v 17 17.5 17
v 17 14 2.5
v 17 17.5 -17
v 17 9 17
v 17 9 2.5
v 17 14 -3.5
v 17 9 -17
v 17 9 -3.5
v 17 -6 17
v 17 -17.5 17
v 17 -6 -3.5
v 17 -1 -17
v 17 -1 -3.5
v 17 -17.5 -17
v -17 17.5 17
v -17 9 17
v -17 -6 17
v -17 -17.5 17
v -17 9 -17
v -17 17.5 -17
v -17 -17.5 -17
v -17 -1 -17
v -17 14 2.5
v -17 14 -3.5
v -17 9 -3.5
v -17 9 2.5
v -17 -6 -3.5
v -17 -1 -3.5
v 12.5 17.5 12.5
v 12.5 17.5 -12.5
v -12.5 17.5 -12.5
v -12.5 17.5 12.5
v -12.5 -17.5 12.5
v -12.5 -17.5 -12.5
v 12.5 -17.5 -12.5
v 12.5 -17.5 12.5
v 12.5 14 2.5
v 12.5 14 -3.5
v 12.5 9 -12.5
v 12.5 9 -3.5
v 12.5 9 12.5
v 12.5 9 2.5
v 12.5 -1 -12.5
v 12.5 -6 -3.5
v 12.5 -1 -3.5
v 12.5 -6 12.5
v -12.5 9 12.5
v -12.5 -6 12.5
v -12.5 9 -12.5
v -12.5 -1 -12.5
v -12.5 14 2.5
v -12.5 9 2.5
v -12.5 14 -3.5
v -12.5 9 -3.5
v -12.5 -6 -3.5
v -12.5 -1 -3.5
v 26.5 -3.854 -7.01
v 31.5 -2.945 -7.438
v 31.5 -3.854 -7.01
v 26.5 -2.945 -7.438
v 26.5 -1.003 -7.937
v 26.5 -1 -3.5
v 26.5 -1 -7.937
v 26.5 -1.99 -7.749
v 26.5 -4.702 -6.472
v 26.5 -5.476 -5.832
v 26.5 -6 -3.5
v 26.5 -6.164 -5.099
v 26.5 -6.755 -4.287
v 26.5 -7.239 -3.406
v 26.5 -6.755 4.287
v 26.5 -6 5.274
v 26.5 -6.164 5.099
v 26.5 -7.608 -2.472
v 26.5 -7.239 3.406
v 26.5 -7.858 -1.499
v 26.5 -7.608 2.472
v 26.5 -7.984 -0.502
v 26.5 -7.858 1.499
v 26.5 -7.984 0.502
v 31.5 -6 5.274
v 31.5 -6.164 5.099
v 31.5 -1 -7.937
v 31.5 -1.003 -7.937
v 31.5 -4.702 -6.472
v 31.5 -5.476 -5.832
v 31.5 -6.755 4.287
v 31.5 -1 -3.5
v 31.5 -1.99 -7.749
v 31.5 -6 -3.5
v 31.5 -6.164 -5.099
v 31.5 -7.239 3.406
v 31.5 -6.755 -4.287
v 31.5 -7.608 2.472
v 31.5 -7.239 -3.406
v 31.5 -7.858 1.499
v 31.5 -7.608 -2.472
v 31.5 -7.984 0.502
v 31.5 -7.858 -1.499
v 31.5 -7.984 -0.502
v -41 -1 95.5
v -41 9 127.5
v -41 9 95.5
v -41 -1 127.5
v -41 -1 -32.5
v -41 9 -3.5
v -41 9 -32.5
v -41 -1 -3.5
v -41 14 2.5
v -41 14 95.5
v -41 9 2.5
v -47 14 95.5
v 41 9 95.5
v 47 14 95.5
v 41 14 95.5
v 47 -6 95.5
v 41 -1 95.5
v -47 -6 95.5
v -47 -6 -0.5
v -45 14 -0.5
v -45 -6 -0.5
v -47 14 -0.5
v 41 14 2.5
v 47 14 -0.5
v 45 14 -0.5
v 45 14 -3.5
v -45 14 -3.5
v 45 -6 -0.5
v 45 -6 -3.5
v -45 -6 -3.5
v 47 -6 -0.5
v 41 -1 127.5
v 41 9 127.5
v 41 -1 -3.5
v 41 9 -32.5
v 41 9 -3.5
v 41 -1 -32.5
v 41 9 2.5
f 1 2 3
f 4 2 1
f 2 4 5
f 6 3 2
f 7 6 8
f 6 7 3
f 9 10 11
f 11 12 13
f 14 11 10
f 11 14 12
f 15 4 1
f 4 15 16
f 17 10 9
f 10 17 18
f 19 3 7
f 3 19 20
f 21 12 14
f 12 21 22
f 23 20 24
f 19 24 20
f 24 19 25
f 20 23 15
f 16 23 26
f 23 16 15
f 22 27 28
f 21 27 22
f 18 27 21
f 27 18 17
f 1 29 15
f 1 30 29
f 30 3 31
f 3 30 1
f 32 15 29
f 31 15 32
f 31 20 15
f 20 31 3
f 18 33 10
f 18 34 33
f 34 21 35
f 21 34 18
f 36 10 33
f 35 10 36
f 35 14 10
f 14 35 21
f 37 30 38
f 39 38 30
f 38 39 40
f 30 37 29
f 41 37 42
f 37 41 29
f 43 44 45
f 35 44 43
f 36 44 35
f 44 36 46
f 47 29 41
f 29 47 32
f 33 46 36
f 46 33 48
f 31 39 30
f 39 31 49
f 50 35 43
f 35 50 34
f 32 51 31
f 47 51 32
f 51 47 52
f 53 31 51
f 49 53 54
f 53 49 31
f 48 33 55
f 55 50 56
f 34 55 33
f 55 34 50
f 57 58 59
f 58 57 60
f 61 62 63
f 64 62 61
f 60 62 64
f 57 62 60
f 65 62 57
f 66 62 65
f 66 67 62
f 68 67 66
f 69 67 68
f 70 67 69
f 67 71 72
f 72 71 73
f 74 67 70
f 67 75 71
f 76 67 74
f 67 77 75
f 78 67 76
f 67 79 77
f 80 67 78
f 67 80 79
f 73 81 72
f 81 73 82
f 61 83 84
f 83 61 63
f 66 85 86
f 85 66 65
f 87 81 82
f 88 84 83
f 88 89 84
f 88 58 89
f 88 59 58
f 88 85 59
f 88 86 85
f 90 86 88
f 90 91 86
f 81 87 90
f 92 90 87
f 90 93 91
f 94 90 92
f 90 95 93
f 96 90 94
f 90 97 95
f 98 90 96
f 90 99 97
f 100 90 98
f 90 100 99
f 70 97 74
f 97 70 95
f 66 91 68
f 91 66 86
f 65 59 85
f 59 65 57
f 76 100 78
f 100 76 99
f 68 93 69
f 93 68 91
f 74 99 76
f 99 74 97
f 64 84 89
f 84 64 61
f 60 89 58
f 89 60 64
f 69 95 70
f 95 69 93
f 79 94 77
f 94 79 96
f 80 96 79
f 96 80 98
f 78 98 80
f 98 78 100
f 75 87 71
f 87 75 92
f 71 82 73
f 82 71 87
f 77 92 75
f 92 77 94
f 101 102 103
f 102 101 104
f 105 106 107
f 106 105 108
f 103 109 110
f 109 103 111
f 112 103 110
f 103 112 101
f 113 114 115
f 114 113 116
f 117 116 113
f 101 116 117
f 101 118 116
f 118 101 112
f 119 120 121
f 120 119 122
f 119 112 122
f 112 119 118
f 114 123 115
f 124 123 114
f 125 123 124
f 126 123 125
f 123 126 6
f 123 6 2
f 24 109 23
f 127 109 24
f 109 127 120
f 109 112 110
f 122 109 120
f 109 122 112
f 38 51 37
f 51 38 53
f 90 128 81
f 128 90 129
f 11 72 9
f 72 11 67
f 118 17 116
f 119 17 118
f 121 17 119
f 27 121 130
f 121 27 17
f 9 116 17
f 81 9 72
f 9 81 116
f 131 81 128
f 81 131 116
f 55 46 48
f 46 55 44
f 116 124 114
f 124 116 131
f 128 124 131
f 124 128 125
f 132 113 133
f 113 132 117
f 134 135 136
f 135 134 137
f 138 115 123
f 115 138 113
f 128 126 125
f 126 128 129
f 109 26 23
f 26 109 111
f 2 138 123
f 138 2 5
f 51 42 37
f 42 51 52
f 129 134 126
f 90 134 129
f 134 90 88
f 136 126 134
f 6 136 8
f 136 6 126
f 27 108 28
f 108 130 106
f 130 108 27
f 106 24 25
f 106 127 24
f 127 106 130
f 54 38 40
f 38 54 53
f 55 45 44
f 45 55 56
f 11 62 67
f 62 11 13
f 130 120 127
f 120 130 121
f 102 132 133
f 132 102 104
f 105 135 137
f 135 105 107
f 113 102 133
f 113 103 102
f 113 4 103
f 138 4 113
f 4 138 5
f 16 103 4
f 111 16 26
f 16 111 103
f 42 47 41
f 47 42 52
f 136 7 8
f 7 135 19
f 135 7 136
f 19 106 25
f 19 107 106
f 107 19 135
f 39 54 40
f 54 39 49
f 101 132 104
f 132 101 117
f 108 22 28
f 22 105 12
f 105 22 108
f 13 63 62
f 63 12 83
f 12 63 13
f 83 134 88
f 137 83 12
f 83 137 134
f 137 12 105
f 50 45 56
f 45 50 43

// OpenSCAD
// ========================================================
// F-14F COCKPIT MOBILE ELECTRONICS RETENTION MOUNT
// HIGH-G ANTI-VIBRATION RAIL CLAMP ASSEMBLY
// ========================================================

$fn = 50; // High-precision mechanical render smoothness

// --- PHYSICAL COCKPIT PROFILE DIMENSIONS (mm) ---
canopy_rail_w  = 25.0; // Dimension of original F-14 interior canopy frame
phone_width    = 82.0; // Accommodation for ruggedized military phone/tablet
phone_height   = 160.0;
clamp_thick    = 4.5;  // 6061-T6 Aluminum structural bracket depth

// --- COLOR PALETTE ---
matte_black    = [0.15, 0.15, 0.16, 1.0]; // Non-reflective anodized military finish
rubber_pad     = [0.30, 0.30, 0.32, 1.0]; // Shock-absorbing silicone vibration isolation
screw_silver   = [0.82, 0.84, 0.86, 1.0]; // High-tensile clamping thumb-fasteners
phone_glass    = [0.0, 0.60, 0.85, 0.45]; // Simulation screen face

// ========================================================
// MECHANICAL COMPONENT GENERATION
// ========================================================

module cockpit_hardware_mount() {
    // A. THE AIRFRAME RAIL CLAMP BASE (Clips onto canopy framework)
    color(matte_black)
    difference() {
        // Main block enclosing the frame profile
        cube([canopy_rail_w + (clamp_thick*2), 35, canopy_rail_w + (clamp_thick*2)], center=true);
        // Interior slot matching the airframe rail width
        cube([canopy_rail_w, 40, canopy_rail_w], center=true);
        // Threaded clamping bolt channel hole
        translate([canopy_rail_w/2 + clamp_thick, 0, 0])
            rotate([0, 90, 0]) cylinder(d=5.2, h=20, center=true);
    }
    
    // Clamping Tension Thumb-Screw Hardware
    color(screw_silver)
        translate([canopy_rail_w/2 + clamp_thick + 4, 0, 0])
        rotate([0, 90, 0]) {
            cylinder(d=5, h=16, center=true);
            translate([0, 0, 8]) cylinder(d=16, h=5, center=true); // Oversized adjustment head
        }

    // B. THE HIGH-G PHONE RETENTION CRADLE (Rotates on central pivot ball)
    translate([0, 0, canopy_rail_w/2 + 35]) {
        // Rear Support Backplate
        color(matte_black) cube([phone_width + 8, 12, phone_height * 0.6], center=true);
        
        // Anti-Vibration Heavy Rubber Liners
        color(rubber_pad) translate([0, -4, 0]) cube([phone_width, 4, phone_height * 0.58], center=true);
        
        // --- ANTI-SHEAR PROFILE: Side Clamping Jaw Retention Lips ---
        color(matte_black) {
            // Left grip wall
            translate([-phone_width/2 - 3, 4, 0]) cube([6, 20, phone_height * 0.6], center=true);
            // Right grip wall
            translate([phone_width/2 + 3, 4, 0]) cube([6, 20, phone_height * 0.6], center=true);
            // Bottom retention shelf to arrest downward vertical G-drop displacement
            translate([0, 4, -phone_height * 0.3]) cube([phone_width + 8, 20, 6], center=true);
        }
        
        // Reference Layout: Mockup visualization of the seated navigation phone
        color(phone_glass) translate([0, 4, 0]) cube([phone_width, 10, phone_height], center=true);
    }
}

// Execute active rendering architecture module
cockpit_hardware_mount();
